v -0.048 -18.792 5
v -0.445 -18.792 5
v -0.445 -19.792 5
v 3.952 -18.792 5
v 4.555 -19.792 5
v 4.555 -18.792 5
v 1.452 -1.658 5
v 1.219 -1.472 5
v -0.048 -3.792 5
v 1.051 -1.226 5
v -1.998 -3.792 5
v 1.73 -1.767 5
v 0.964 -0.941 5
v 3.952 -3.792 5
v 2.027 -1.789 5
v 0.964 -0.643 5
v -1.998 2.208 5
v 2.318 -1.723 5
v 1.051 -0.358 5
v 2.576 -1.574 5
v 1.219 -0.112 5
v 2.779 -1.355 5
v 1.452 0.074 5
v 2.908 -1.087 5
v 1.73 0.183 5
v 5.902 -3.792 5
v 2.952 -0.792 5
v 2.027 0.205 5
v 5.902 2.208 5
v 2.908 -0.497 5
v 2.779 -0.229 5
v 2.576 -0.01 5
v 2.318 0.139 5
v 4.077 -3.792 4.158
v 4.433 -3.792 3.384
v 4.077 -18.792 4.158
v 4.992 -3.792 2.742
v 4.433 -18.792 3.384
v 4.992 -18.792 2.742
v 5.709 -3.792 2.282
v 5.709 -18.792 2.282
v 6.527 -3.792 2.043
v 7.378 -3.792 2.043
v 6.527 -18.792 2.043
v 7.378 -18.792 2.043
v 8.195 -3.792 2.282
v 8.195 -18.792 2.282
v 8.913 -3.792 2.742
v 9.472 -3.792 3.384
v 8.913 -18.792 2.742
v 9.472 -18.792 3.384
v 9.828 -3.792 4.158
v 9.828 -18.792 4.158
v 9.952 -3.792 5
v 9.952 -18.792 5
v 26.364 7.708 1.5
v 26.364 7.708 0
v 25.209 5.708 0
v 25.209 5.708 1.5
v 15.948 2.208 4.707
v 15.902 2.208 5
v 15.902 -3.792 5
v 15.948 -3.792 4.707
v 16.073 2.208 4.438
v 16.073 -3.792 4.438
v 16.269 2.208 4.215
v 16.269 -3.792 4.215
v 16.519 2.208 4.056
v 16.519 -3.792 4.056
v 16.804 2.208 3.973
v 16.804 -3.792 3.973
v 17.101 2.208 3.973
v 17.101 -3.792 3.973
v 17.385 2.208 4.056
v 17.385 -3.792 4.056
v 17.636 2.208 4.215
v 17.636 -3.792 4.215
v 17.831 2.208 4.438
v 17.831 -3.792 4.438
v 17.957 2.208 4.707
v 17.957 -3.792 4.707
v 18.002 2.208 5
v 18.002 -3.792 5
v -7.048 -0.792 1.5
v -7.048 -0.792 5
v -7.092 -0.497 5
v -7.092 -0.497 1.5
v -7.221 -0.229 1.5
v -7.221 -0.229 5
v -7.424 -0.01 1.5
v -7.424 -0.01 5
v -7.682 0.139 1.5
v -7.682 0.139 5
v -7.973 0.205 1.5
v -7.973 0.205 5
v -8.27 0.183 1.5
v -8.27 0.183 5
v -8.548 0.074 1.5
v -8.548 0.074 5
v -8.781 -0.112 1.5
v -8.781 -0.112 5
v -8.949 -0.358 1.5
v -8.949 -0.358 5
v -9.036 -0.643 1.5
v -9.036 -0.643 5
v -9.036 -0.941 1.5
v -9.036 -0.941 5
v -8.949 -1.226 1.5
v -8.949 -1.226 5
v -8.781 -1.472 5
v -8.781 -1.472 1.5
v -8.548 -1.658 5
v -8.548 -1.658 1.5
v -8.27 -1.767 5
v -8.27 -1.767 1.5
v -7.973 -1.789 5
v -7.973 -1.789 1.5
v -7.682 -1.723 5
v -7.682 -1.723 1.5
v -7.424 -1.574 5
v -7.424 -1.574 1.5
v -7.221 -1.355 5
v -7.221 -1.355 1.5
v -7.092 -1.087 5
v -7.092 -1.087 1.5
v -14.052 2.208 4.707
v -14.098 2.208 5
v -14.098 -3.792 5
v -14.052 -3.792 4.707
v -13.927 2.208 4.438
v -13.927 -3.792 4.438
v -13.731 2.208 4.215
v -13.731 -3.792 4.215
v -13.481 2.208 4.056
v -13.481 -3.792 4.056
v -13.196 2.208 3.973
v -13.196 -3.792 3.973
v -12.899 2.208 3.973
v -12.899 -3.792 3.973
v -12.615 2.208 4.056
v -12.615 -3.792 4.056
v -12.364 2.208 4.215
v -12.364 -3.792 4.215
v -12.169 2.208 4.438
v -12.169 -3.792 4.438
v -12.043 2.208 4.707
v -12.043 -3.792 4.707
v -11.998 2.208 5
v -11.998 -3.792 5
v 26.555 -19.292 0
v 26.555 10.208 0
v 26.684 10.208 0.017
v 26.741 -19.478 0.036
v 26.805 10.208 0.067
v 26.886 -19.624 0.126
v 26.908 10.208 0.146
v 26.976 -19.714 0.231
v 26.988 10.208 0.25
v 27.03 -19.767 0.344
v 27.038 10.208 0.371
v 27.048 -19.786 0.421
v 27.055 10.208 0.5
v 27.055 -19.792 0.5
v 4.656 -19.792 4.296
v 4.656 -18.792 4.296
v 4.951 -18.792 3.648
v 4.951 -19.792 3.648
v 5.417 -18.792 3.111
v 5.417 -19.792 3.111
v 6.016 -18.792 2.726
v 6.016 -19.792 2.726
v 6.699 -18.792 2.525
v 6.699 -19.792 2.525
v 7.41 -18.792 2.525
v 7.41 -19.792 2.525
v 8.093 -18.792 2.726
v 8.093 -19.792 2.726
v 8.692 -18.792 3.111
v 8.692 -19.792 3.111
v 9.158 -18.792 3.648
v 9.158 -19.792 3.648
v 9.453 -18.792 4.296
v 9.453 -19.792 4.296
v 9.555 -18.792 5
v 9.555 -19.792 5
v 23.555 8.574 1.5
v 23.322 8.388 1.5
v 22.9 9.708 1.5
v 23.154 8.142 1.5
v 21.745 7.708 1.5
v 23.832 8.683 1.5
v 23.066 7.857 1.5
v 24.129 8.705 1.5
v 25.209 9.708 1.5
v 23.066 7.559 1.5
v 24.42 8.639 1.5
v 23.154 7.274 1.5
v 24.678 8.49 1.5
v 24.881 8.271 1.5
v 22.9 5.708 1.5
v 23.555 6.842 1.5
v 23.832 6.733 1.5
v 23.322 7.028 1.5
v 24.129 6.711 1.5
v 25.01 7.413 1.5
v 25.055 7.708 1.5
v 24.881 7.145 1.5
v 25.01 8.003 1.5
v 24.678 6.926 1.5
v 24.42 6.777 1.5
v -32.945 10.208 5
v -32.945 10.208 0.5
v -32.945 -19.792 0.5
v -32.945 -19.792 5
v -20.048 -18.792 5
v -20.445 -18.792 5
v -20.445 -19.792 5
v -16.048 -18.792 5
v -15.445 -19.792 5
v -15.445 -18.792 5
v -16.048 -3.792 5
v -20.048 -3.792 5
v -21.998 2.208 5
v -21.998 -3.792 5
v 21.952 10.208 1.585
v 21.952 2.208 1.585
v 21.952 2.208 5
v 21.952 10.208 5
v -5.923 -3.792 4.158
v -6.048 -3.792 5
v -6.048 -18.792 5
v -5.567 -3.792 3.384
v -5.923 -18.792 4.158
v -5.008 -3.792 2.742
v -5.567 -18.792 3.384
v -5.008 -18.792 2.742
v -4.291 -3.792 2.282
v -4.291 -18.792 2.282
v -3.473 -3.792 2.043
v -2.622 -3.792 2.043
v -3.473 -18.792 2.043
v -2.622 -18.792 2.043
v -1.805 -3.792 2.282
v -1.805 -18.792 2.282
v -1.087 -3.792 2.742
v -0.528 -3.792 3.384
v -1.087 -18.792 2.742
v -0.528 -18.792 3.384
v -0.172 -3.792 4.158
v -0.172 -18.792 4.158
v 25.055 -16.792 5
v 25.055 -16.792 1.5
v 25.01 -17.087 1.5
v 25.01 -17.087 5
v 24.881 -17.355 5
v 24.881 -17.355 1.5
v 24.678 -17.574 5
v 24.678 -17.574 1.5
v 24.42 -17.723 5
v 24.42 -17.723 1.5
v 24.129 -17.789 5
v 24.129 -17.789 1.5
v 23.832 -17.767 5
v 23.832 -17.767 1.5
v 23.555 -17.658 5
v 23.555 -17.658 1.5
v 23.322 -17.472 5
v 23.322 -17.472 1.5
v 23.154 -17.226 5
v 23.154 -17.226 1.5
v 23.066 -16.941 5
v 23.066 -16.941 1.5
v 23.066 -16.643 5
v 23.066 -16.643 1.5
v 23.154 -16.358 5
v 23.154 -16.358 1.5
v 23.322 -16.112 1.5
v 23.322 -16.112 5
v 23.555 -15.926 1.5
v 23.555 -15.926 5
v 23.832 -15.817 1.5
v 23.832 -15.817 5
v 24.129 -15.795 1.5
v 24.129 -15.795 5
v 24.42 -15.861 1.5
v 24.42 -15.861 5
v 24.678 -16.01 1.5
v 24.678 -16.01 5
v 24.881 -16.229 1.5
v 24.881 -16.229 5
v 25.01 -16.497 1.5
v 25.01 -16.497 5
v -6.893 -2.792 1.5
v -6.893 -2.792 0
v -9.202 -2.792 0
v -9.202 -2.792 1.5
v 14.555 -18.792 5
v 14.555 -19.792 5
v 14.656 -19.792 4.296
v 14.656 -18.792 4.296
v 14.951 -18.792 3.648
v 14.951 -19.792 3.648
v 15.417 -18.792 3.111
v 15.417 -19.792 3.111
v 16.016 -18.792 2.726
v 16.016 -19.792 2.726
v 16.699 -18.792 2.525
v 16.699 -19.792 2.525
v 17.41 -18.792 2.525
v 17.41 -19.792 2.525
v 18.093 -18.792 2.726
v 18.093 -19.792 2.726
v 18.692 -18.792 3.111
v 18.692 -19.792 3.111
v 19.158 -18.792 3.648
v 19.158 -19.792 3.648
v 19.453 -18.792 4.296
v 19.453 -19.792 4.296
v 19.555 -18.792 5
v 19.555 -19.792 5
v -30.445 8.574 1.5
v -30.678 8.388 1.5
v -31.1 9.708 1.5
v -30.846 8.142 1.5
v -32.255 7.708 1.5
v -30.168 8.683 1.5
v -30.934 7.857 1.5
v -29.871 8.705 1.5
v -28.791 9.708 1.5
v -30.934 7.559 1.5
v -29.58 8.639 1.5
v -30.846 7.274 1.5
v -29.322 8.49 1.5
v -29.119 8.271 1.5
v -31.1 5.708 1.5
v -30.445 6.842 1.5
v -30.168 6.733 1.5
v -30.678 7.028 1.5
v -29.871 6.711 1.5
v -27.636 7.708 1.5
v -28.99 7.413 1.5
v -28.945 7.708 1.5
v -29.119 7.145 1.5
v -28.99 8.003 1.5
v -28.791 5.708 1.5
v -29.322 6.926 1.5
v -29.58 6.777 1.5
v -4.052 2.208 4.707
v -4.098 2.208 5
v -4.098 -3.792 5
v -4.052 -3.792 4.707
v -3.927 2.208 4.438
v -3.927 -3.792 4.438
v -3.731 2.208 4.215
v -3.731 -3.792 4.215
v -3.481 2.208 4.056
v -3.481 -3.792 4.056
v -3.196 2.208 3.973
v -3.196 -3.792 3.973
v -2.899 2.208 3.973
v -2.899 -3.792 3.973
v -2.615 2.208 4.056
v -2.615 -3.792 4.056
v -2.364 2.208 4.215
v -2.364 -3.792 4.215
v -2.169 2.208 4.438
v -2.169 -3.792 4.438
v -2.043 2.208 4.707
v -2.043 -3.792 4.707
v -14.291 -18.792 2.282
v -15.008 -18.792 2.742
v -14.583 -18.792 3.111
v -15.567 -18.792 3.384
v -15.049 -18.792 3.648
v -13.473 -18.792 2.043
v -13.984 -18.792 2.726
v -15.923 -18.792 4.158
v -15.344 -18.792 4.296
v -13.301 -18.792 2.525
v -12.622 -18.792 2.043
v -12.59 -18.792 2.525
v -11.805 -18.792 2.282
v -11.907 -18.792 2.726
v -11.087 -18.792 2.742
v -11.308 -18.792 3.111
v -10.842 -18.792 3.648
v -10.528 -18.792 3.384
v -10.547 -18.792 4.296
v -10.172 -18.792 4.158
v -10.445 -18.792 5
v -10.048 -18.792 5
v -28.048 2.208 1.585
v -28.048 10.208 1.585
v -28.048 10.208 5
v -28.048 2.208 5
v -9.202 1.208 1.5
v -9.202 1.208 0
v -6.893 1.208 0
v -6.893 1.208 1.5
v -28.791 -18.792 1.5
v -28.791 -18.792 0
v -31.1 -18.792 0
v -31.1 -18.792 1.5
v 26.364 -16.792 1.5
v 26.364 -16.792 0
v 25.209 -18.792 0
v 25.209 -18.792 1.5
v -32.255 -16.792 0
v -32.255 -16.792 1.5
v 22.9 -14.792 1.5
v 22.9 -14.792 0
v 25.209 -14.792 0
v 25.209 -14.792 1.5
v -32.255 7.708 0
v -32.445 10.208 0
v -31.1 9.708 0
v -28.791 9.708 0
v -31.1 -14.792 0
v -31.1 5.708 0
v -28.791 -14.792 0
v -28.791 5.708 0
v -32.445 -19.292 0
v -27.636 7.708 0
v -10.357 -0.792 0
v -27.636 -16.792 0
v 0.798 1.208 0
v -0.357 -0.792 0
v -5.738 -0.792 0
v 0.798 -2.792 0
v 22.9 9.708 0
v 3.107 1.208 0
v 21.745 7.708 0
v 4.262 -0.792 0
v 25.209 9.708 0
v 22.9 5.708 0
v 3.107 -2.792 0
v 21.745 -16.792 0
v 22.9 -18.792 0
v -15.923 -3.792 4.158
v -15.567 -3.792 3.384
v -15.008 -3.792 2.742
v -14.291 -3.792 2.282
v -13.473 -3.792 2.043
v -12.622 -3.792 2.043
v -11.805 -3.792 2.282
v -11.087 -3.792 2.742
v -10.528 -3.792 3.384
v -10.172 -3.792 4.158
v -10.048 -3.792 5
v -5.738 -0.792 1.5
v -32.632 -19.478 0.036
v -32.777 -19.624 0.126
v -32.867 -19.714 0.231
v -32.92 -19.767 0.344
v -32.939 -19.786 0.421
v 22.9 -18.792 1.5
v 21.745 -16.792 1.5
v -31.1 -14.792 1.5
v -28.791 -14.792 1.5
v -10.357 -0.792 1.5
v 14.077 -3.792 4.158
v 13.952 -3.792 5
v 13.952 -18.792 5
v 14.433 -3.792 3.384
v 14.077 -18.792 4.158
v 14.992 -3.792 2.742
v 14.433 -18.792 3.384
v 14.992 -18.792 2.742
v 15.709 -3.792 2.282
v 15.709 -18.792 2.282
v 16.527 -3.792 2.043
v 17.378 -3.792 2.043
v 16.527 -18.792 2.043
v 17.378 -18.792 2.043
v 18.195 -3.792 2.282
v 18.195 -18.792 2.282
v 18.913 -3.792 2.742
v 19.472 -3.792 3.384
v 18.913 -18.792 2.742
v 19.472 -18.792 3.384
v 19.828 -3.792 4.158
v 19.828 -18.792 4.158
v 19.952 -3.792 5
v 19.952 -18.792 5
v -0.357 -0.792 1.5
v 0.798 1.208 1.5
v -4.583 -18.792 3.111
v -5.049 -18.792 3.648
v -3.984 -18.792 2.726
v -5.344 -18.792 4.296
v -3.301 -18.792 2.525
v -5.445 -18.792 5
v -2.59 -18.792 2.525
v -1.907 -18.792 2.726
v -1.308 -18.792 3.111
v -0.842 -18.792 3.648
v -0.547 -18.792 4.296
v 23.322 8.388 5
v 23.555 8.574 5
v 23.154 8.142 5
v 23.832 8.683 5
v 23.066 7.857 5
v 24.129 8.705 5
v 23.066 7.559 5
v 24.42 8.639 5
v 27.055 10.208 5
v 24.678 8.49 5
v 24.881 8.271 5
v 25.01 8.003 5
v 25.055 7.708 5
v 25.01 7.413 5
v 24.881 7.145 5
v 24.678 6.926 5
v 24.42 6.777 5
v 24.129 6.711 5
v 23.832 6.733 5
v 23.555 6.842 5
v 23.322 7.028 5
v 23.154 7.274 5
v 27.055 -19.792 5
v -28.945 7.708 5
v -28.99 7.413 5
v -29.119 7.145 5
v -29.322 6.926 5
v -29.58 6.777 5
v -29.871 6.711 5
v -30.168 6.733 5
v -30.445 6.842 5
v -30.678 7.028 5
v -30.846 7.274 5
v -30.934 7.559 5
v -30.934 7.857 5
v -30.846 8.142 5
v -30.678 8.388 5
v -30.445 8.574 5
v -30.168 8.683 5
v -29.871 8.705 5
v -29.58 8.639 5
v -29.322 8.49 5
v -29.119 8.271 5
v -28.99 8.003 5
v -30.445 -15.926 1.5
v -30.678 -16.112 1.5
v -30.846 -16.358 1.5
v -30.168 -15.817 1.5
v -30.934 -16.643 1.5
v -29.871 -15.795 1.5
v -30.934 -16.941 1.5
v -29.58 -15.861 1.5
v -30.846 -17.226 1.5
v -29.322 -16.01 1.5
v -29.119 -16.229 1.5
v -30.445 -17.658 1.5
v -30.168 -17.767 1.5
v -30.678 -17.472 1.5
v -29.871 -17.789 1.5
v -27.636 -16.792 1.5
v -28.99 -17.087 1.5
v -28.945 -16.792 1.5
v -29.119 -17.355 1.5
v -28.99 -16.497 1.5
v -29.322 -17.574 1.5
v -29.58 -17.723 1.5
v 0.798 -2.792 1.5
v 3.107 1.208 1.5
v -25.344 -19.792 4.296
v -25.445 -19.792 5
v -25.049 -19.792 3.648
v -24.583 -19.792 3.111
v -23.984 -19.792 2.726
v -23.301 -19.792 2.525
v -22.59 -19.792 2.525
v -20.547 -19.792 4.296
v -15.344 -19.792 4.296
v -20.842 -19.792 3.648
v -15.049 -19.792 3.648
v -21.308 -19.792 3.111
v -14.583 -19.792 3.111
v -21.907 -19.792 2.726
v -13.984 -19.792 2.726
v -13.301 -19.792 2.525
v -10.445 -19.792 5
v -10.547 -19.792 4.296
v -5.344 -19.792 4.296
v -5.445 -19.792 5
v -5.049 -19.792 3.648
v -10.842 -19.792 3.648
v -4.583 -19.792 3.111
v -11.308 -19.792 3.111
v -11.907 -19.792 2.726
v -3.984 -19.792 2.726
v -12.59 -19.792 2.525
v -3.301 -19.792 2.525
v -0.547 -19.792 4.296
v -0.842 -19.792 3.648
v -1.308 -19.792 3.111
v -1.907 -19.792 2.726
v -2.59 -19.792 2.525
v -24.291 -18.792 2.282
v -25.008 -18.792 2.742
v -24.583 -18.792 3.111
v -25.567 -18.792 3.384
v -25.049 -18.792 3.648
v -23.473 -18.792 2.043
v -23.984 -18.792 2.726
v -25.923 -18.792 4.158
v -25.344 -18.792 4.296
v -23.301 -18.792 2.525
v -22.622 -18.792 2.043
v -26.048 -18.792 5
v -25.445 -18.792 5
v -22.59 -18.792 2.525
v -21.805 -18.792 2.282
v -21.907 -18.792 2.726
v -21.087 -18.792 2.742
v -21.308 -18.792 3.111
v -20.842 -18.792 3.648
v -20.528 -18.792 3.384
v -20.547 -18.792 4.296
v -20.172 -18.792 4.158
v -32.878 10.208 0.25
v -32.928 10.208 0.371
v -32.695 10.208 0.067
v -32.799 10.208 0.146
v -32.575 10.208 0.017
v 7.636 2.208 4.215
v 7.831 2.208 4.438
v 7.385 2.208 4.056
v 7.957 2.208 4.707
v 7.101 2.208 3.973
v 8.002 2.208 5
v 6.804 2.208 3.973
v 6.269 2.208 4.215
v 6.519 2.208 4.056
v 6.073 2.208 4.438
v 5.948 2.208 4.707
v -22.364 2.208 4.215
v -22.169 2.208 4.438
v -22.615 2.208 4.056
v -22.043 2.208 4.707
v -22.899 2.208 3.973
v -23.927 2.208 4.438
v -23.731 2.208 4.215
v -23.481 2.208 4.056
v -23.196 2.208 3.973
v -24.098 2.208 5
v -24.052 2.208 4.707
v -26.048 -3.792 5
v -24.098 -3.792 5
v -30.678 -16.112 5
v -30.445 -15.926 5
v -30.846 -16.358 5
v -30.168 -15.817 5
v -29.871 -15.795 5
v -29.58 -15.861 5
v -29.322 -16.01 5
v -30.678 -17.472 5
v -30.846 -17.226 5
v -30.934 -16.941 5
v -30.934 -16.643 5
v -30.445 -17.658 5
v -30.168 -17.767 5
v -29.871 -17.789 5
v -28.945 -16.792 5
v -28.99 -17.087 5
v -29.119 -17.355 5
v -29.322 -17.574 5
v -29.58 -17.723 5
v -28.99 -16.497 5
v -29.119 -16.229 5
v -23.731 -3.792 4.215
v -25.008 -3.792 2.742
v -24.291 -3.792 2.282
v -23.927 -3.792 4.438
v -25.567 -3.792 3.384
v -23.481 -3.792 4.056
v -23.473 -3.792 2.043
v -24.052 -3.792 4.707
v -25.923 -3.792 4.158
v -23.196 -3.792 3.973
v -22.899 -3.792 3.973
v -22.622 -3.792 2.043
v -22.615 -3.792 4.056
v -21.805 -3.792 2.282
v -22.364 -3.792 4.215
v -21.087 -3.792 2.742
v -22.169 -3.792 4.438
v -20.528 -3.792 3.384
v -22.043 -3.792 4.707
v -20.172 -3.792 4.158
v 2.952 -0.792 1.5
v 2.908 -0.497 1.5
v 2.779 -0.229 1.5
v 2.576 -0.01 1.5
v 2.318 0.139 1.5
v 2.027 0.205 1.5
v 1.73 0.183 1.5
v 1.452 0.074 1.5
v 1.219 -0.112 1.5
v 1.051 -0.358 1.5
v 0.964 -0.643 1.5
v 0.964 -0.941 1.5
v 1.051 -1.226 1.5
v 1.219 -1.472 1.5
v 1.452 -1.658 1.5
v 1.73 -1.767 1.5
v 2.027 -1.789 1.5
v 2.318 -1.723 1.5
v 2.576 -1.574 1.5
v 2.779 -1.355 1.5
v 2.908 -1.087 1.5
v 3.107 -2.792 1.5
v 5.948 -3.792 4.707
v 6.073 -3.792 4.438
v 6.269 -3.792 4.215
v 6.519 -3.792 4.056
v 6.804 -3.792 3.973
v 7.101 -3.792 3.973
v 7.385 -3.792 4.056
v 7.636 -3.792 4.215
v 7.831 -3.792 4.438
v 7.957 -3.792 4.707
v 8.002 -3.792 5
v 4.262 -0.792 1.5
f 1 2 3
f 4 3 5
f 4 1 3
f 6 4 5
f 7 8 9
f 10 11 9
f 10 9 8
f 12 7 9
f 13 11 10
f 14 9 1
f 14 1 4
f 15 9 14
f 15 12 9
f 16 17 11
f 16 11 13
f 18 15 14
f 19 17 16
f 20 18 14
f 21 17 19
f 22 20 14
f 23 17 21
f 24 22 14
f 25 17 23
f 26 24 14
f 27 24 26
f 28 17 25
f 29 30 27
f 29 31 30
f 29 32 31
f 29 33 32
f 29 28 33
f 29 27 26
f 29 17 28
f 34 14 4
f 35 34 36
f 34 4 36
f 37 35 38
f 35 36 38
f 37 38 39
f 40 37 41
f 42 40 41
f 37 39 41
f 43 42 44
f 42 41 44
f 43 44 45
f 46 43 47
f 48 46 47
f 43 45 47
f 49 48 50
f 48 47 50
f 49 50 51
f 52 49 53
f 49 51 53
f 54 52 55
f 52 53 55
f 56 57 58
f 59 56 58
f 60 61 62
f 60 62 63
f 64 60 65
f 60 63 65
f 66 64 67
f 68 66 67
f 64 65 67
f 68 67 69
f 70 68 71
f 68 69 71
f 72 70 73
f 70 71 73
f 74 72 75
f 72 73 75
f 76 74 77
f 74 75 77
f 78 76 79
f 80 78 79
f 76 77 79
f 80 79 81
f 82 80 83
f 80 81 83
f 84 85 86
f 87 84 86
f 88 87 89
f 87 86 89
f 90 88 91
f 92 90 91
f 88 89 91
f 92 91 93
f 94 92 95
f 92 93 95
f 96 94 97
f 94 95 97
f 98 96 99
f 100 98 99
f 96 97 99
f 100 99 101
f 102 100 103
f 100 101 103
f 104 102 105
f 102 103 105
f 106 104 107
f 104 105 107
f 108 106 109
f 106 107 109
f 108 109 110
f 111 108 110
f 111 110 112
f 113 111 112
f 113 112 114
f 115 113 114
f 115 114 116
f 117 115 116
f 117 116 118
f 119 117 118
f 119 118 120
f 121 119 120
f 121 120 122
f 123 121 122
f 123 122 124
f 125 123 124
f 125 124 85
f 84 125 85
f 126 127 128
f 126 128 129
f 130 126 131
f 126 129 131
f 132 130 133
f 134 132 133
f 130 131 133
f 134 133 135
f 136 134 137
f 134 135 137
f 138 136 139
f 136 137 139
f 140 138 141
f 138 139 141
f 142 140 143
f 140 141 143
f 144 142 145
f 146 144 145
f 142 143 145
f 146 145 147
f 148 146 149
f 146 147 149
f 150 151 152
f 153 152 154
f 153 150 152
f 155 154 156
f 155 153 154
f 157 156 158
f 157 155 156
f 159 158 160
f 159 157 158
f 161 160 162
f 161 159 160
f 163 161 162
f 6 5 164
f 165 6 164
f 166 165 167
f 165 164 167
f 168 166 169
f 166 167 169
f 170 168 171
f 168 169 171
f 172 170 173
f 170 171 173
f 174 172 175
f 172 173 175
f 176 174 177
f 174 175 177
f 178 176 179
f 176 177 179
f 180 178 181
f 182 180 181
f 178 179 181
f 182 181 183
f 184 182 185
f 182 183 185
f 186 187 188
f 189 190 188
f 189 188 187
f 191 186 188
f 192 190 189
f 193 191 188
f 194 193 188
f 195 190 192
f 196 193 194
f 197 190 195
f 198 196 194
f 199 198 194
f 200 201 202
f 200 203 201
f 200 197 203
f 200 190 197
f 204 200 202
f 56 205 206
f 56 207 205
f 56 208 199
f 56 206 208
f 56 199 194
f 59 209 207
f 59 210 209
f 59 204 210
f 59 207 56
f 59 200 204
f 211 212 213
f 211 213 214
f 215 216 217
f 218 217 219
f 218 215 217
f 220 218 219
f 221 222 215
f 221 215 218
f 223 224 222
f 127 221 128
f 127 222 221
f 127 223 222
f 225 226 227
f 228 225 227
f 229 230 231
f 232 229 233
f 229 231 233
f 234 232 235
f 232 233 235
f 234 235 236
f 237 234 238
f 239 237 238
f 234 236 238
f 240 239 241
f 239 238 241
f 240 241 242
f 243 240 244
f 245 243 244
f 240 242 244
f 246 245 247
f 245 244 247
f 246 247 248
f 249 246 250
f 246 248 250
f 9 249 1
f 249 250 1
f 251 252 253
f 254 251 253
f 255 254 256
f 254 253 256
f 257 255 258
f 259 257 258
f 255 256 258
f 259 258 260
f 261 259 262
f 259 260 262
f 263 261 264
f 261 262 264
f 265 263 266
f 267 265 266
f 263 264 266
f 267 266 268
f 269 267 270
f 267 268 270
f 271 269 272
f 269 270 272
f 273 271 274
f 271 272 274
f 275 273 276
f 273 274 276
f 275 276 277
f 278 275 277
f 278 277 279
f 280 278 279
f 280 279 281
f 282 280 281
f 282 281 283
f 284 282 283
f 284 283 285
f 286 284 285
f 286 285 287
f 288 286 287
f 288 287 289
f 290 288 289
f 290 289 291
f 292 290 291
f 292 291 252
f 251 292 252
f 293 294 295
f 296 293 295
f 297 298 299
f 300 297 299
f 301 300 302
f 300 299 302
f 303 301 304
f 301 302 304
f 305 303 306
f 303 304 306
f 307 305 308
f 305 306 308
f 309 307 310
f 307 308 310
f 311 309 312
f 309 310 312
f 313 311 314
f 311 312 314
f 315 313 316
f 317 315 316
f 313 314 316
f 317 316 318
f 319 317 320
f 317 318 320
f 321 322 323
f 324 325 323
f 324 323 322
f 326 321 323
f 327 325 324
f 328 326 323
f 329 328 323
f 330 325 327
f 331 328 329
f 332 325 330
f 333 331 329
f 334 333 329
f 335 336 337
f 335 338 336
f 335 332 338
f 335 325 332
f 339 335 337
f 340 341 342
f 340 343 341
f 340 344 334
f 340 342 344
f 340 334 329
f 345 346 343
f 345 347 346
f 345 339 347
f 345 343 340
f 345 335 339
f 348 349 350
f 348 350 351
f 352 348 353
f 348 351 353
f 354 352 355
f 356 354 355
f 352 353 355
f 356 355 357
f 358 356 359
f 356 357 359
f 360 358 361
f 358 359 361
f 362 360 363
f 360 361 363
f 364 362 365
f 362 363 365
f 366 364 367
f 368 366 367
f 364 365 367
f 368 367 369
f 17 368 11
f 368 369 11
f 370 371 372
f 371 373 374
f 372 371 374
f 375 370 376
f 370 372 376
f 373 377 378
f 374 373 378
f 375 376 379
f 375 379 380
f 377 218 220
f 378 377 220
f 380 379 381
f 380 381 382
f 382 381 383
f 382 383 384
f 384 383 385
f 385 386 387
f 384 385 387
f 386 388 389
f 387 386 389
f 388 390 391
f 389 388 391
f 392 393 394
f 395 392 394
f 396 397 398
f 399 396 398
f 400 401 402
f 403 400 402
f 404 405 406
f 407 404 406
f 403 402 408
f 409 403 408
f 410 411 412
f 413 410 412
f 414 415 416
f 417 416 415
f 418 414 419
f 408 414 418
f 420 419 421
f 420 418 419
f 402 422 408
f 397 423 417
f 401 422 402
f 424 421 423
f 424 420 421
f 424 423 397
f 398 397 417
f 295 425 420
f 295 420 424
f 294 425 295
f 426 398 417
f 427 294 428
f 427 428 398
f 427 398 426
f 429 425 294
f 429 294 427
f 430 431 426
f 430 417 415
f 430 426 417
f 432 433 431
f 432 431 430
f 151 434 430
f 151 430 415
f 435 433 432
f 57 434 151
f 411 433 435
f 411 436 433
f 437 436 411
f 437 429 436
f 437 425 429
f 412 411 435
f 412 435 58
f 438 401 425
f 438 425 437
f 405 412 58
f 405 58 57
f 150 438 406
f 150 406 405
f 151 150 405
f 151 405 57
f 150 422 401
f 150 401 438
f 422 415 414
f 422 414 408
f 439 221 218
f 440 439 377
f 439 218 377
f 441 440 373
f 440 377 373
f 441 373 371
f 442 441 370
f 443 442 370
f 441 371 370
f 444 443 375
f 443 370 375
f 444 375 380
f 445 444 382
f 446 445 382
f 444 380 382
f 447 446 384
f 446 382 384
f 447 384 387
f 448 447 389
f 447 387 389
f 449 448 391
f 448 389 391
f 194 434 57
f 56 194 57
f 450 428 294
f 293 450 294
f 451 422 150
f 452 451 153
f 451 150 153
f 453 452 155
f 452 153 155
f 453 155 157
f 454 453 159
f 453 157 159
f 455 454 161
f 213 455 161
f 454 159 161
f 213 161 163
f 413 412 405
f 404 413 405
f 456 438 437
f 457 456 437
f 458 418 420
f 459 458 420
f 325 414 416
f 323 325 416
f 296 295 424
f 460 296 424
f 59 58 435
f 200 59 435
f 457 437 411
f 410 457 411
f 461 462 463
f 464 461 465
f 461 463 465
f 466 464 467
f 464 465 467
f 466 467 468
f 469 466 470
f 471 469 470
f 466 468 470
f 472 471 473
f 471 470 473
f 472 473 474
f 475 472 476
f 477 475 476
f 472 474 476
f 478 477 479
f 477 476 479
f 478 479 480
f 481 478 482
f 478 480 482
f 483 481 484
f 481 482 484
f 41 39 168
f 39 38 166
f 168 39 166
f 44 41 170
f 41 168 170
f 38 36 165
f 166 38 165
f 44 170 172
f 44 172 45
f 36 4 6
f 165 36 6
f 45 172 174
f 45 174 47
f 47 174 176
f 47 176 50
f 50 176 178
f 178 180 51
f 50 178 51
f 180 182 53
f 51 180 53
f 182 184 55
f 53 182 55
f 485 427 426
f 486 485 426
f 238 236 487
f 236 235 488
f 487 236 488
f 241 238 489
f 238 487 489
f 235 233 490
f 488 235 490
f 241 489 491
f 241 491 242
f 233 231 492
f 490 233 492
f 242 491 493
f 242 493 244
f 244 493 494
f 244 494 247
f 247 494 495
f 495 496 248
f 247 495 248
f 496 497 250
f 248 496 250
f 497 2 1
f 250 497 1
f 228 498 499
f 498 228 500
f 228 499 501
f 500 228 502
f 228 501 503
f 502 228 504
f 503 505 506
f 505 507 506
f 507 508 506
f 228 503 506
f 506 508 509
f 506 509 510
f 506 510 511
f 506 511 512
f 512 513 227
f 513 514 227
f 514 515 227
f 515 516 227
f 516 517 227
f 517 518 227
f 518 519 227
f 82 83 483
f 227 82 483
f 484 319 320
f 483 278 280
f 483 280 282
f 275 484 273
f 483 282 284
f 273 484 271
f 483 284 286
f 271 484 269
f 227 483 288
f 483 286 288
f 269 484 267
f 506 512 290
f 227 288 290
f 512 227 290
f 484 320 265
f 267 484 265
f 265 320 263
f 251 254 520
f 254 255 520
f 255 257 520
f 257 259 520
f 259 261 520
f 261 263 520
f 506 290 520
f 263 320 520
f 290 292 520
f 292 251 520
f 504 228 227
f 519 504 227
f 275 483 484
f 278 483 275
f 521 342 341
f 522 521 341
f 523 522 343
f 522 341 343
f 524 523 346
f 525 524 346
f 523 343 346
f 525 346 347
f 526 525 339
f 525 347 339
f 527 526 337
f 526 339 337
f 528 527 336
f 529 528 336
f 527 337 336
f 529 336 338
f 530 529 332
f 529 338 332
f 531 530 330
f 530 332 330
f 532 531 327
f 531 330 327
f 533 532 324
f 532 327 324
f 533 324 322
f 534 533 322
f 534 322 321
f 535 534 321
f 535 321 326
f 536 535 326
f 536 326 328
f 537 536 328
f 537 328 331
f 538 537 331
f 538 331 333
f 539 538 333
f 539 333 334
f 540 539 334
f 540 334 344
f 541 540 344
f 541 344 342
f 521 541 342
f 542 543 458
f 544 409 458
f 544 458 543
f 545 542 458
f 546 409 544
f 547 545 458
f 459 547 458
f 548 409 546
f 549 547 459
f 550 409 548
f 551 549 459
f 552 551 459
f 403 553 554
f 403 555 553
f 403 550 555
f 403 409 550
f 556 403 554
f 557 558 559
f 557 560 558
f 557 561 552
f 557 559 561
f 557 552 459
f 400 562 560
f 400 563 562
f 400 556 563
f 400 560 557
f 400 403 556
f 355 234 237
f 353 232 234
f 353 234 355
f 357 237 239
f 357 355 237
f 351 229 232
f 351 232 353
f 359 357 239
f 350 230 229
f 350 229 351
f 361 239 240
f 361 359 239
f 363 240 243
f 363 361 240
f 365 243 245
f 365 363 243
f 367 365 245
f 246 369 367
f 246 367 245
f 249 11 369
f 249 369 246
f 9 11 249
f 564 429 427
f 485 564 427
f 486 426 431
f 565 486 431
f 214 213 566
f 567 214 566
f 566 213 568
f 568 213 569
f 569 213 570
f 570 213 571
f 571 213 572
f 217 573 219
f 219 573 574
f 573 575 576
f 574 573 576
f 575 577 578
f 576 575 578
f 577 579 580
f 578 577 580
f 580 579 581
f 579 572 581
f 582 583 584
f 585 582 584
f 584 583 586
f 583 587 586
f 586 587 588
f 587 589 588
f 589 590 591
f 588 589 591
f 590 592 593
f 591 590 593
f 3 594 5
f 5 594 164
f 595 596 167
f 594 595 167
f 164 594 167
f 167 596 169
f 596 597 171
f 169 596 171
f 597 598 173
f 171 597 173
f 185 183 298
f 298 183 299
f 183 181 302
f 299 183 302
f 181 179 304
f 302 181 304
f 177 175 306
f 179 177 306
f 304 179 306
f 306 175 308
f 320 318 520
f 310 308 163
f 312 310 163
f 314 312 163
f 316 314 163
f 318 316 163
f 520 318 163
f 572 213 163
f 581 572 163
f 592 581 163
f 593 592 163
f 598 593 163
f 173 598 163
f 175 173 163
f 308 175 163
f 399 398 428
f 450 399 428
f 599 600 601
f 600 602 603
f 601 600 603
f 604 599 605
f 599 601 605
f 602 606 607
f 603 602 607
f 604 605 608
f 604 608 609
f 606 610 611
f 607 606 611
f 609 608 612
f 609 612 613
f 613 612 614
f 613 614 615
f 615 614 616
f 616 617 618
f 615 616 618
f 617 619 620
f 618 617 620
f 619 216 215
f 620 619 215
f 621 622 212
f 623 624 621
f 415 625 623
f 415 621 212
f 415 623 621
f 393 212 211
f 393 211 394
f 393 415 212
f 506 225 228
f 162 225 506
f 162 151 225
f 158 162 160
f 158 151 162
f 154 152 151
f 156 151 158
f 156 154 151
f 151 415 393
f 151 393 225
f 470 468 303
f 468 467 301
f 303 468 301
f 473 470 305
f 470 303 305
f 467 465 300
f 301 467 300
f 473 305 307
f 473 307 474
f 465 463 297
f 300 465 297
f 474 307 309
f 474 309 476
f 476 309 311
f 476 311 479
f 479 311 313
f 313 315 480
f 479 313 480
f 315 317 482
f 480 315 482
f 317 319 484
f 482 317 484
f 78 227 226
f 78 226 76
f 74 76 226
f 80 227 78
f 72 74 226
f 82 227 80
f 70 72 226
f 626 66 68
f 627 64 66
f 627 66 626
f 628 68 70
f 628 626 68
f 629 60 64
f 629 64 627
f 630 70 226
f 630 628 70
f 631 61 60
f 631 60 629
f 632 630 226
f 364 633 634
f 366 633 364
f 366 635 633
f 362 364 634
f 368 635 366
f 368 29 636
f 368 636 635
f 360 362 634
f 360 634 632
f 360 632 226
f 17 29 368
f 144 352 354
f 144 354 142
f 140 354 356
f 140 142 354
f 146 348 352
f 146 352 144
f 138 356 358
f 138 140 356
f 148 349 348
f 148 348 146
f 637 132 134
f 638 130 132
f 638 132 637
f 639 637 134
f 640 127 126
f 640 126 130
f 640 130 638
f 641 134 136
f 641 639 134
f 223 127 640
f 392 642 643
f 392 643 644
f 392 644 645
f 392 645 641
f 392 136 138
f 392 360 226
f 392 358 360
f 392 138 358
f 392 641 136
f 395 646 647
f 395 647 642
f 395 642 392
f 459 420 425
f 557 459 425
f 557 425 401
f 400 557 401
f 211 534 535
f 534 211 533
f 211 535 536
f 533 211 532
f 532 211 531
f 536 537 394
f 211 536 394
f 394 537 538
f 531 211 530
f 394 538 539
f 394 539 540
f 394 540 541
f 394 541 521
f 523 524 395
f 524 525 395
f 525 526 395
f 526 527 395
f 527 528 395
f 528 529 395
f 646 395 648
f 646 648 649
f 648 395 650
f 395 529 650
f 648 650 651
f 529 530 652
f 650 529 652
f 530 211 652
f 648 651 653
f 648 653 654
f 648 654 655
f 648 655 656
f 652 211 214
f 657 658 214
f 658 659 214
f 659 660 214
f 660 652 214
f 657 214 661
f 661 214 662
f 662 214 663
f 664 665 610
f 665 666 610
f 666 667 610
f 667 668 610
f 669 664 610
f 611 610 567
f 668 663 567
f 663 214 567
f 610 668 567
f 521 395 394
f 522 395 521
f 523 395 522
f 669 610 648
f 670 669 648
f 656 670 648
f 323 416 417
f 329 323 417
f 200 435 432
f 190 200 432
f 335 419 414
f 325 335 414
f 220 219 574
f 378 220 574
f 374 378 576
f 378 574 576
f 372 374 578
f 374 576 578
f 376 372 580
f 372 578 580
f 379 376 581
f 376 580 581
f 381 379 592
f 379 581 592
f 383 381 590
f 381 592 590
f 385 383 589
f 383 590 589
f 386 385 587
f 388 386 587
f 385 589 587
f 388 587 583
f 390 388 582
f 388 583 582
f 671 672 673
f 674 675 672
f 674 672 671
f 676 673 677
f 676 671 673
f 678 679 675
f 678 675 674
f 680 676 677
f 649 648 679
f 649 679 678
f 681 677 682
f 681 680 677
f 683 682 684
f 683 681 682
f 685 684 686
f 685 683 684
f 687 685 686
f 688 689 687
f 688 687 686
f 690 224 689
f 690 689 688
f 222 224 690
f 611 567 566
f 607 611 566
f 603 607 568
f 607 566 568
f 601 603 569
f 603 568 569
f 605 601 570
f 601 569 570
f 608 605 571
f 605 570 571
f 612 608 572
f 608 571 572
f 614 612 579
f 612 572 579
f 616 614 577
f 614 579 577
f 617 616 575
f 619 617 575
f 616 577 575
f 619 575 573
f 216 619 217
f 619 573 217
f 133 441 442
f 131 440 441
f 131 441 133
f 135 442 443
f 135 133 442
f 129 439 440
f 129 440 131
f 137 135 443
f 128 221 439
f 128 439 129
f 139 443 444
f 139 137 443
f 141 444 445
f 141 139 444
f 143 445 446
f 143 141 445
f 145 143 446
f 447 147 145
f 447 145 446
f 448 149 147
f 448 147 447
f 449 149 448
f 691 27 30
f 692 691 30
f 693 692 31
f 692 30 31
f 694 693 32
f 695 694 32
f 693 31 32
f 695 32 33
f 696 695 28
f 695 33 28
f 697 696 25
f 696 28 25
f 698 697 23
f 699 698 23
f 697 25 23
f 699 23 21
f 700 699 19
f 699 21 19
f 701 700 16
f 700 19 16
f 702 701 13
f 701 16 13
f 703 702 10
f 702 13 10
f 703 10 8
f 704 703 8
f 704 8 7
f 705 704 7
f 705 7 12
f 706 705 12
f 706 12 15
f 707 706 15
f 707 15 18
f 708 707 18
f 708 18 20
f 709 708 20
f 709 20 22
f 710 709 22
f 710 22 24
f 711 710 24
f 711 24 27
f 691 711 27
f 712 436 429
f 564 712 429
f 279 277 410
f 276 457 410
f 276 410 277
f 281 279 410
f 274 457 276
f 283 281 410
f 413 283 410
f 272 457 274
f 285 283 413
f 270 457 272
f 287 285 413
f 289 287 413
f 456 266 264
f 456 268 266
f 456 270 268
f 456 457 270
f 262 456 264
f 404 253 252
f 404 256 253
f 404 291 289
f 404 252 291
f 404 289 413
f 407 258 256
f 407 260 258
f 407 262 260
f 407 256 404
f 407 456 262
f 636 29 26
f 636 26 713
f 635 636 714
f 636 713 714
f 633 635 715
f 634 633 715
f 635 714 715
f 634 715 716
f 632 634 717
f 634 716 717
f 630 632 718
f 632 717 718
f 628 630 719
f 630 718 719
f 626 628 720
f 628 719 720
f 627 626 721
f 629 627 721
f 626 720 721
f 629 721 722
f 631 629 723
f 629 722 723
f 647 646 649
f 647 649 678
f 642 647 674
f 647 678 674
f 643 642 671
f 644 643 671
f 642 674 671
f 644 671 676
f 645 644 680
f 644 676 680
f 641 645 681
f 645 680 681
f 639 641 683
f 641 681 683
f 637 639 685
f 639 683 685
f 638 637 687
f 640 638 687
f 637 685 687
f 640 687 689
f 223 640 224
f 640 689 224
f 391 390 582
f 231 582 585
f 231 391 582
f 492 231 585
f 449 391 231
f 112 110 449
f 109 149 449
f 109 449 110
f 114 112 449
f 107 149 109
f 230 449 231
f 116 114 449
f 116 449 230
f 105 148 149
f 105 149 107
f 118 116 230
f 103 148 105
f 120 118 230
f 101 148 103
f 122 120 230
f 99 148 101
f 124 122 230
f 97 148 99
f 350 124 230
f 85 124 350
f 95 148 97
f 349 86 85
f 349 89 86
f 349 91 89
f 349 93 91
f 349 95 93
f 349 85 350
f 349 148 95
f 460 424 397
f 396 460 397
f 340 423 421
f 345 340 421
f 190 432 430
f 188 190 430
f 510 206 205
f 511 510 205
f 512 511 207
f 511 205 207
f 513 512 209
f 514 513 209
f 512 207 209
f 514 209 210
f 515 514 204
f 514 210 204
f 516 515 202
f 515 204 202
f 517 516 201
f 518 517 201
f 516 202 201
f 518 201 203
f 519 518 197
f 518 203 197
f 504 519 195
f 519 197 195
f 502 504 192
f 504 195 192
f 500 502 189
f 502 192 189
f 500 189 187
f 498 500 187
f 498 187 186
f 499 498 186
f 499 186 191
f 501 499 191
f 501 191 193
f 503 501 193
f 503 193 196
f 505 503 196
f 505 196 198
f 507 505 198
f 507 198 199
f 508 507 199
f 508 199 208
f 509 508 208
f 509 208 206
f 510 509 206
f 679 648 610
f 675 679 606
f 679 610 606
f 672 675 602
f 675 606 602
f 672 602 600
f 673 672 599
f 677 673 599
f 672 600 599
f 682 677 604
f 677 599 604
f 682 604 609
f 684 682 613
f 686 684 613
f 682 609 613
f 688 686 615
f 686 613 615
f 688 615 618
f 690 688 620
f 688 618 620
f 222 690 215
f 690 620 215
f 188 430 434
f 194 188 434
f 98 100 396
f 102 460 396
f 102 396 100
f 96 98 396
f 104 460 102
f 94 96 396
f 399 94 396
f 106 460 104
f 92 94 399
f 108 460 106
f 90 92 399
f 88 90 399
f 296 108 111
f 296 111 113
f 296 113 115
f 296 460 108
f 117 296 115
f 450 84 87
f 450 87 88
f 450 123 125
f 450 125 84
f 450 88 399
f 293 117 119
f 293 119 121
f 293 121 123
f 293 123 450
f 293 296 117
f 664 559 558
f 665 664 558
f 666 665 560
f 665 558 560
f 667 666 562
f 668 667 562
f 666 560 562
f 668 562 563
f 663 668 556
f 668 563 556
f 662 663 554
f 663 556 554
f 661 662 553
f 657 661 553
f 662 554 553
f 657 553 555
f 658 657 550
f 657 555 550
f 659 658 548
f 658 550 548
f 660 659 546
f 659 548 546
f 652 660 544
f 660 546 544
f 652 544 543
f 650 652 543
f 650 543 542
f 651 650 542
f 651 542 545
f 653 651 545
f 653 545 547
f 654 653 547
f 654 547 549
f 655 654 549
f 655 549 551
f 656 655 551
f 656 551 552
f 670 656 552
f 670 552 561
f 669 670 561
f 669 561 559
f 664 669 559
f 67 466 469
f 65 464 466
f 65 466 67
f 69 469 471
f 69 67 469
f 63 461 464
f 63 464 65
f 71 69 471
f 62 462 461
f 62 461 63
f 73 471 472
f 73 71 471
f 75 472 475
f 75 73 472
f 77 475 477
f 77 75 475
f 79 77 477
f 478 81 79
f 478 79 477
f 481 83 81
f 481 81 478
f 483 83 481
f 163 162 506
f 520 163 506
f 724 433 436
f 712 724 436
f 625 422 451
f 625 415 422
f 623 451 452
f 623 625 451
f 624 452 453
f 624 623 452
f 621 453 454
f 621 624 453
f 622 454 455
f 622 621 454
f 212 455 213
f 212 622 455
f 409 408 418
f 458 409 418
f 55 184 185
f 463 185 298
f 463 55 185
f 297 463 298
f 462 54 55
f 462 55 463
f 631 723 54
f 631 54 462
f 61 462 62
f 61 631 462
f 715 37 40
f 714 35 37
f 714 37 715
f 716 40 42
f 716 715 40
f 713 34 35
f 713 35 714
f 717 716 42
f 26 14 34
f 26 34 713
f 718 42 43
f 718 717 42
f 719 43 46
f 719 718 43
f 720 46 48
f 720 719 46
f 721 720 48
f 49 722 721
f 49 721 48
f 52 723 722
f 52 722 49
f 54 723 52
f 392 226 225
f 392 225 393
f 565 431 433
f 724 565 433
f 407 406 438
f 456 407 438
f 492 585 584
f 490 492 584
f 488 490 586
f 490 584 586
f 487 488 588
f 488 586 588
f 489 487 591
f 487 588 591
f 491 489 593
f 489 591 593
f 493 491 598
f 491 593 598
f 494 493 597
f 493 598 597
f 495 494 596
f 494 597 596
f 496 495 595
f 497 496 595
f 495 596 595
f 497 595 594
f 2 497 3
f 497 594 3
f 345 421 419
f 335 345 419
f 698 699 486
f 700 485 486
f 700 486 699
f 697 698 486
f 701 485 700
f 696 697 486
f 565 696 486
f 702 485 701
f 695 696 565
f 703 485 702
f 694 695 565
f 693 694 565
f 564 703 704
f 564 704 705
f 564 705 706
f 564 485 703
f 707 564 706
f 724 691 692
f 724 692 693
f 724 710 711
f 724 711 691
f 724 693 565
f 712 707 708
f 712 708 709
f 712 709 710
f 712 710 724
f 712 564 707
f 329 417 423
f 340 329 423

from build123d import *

# Parameters (mm, degrees)
F0_W      = 60
F0_H      = 25
F1_DEPTH  = 5
F2_R      = 2.5
F3_DEPTH  = 10
F5_R      = 3
F6_DEPTH  = 15
F7_R      = 1.05
F8_DEPTH  = 29
F9_W      = 50
F9_H      = 3.4154356362
F10_DEPTH = 3
F11_DEPTH = 5
F12_R     = 0.5
F14_R     = 1
F13_R     = 1
F15_DEPTH = 5.001
F16_R     = 1
F17_DEPTH = 5
F19_DEPTH = 1.5


with BuildPart() as f1:
    # F0 (on Top) → F1 (new body)
    with BuildSketch(Plane.XY):
        with Locations((-2.9453901201, -7.2920476746)):
            Rectangle(F0_W, F0_H)
    extrude(amount=F1_DEPTH)

    # F2 (on face) → F3 (cut)
    with BuildSketch(Plane.XZ.offset(19.7920476746)):
        with Locations((-22.9453901201, 5)):
            Circle(F2_R)
        with Locations((-12.9453901201, 5)):
            Circle(F2_R)
        with Locations((-2.9453901201, 5)):
            Circle(F2_R)
        with Locations((7.0546098799, 5)):
            Circle(F2_R)
        with Locations((17.0546098799, 5)):
            Circle(F2_R)
    extrude(amount=-F3_DEPTH, mode=Mode.SUBTRACT)

    # F5 (on offset) → F6 (cut)
    with BuildSketch(Plane.XZ.offset(18.7920476746)):
        with Locations((-23.0476632714, 5.0127296709)):
            Circle(F5_R)
        with Locations((-13.0476632714, 5.0127296709)):
            Circle(F5_R)
        with Locations((-3.0476632714, 5.0127296709)):
            Circle(F5_R)
        with Locations((6.9523367286, 5.0127296709)):
            Circle(F5_R)
        with Locations((16.9523367286, 5.0127296709)):
            Circle(F5_R)
    extrude(amount=-F6_DEPTH, mode=Mode.SUBTRACT)

    # F7 (on face) → F8 (cut)
    with BuildSketch(Plane.XZ.offset(3.7920476746)):
        with Locations((-23.0476632714, 5.0127296709)):
            Circle(F7_R)
        with Locations((-13.0476632714, 5.0127296709)):
            Circle(F7_R)
        with Locations((-3.0476632714, 5.0127296709)):
            Circle(F7_R)
        with Locations((6.9523367286, 5.0127296709)):
            Circle(F7_R)
        with Locations((16.9523367286, 5.0127296709)):
            Circle(F7_R)
    extrude(amount=-F8_DEPTH, mode=Mode.SUBTRACT)

    # F9 (on face) → F10 (cut)
    with BuildSketch(Plane(origin=(0, 5.2079523254, 0), x_dir=(-1, 0, 0), z_dir=(0, 1, 0))):
        with Locations((3.0476632714, 3.2922821819)):
            Rectangle(F9_W, F9_H)
    extrude(amount=-F10_DEPTH, mode=Mode.SUBTRACT)

    # F11 (add): a face of the model
    f11_faces = [f1.faces().sort_by_distance(p)[0] for p in [
        (-2.8102387692, 5.2079523254, 1.4530193808),
    ]]
    extrude(f11_faces, amount=F11_DEPTH)

    # F12
    f12_edges = [f1.edges().sort_by_distance(p)[0] for p in [
        (27.05461, -4.792048, 0),
        (-2.94539, -19.792048, 0),
        (-32.94539, -4.792048, 0),
    ]]
    fillet(f12_edges, radius=F12_R)

    # F14 (on face) + F13 (on face) → F15 (cut, through all)
    with BuildSketch(Plane(origin=(0, 0, 0), x_dir=(1, 0, 0), z_dir=(0, 0, -1))):
        with Locations((-29.9453901201, -7.7079523254)):
            Circle(F14_R)
        with Locations((24.0546098799, -7.7079523254)):
            Circle(F14_R)
    with BuildSketch(Plane(origin=(0, 0, 0), x_dir=(1, 0, 0), z_dir=(0, 0, -1))):
        with Locations((-29.9453901201, 16.7920476746)):
            Circle(F13_R)
        with Locations((24.0546098799, 16.7920476746)):
            Circle(F13_R)
    extrude(amount=-F15_DEPTH, mode=Mode.SUBTRACT)

    # F16 (on face) → F17 (cut)
    with BuildSketch(Plane.XY.offset(5)):
        with Locations((1.9524138955, -0.7920476746)):
            Circle(F16_R)
        with Locations((-8.0475861045, -0.7920476746)):
            Circle(F16_R)
    extrude(amount=-F17_DEPTH, mode=Mode.SUBTRACT)

    # F18 (on face) → F19 (cut)
    with BuildSketch(Plane(origin=(0, 0, 0), x_dir=(1, 0, 0), z_dir=(0, 0, -1))):
        Polygon((25.2093104182, -5.7079523254), (22.8999093415, -5.7079523254), (21.7452088031, -7.7079523254), (22.8999093415, -9.7079523254), (25.2093104182, -9.7079523254), (26.3640109566, -7.7079523254), align=None)
        Polygon((25.2093104182, 18.7920476746), (22.8999093415, 18.7920476746), (21.7452088031, 16.7920476746), (22.8999093415, 14.7920476746), (25.2093104182, 14.7920476746), (26.3640109566, 16.7920476746), align=None)
        Polygon((-28.7906895818, 18.7920476746), (-31.1000906585, 18.7920476746), (-32.2547911969, 16.7920476746), (-31.1000906585, 14.7920476746), (-28.7906895818, 14.7920476746), (-27.6359890434, 16.7920476746), align=None)
        Polygon((-31.1000906585, -9.7079523254), (-28.7906895818, -9.7079523254), (-27.6359890434, -7.7079523254), (-28.7906895818, -5.7079523254), (-31.1000906585, -5.7079523254), (-32.2547911969, -7.7079523254), align=None)
        Polygon((0.7977133571, -1.2079523254), (3.1071144338, -1.2079523254), (4.2618149722, 0.7920476746), (3.1071144338, 2.7920476746), (0.7977133571, 2.7920476746), (-0.3569871813, 0.7920476746), align=None)
        Polygon((-9.2022866429, -1.2079523254), (-6.8928855662, -1.2079523254), (-5.7381850278, 0.7920476746), (-6.8928855662, 2.7920476746), (-9.2022866429, 2.7920476746), (-10.3569871813, 0.7920476746), align=None)
    extrude(amount=-F19_DEPTH, mode=Mode.SUBTRACT)


solid = f1.part
